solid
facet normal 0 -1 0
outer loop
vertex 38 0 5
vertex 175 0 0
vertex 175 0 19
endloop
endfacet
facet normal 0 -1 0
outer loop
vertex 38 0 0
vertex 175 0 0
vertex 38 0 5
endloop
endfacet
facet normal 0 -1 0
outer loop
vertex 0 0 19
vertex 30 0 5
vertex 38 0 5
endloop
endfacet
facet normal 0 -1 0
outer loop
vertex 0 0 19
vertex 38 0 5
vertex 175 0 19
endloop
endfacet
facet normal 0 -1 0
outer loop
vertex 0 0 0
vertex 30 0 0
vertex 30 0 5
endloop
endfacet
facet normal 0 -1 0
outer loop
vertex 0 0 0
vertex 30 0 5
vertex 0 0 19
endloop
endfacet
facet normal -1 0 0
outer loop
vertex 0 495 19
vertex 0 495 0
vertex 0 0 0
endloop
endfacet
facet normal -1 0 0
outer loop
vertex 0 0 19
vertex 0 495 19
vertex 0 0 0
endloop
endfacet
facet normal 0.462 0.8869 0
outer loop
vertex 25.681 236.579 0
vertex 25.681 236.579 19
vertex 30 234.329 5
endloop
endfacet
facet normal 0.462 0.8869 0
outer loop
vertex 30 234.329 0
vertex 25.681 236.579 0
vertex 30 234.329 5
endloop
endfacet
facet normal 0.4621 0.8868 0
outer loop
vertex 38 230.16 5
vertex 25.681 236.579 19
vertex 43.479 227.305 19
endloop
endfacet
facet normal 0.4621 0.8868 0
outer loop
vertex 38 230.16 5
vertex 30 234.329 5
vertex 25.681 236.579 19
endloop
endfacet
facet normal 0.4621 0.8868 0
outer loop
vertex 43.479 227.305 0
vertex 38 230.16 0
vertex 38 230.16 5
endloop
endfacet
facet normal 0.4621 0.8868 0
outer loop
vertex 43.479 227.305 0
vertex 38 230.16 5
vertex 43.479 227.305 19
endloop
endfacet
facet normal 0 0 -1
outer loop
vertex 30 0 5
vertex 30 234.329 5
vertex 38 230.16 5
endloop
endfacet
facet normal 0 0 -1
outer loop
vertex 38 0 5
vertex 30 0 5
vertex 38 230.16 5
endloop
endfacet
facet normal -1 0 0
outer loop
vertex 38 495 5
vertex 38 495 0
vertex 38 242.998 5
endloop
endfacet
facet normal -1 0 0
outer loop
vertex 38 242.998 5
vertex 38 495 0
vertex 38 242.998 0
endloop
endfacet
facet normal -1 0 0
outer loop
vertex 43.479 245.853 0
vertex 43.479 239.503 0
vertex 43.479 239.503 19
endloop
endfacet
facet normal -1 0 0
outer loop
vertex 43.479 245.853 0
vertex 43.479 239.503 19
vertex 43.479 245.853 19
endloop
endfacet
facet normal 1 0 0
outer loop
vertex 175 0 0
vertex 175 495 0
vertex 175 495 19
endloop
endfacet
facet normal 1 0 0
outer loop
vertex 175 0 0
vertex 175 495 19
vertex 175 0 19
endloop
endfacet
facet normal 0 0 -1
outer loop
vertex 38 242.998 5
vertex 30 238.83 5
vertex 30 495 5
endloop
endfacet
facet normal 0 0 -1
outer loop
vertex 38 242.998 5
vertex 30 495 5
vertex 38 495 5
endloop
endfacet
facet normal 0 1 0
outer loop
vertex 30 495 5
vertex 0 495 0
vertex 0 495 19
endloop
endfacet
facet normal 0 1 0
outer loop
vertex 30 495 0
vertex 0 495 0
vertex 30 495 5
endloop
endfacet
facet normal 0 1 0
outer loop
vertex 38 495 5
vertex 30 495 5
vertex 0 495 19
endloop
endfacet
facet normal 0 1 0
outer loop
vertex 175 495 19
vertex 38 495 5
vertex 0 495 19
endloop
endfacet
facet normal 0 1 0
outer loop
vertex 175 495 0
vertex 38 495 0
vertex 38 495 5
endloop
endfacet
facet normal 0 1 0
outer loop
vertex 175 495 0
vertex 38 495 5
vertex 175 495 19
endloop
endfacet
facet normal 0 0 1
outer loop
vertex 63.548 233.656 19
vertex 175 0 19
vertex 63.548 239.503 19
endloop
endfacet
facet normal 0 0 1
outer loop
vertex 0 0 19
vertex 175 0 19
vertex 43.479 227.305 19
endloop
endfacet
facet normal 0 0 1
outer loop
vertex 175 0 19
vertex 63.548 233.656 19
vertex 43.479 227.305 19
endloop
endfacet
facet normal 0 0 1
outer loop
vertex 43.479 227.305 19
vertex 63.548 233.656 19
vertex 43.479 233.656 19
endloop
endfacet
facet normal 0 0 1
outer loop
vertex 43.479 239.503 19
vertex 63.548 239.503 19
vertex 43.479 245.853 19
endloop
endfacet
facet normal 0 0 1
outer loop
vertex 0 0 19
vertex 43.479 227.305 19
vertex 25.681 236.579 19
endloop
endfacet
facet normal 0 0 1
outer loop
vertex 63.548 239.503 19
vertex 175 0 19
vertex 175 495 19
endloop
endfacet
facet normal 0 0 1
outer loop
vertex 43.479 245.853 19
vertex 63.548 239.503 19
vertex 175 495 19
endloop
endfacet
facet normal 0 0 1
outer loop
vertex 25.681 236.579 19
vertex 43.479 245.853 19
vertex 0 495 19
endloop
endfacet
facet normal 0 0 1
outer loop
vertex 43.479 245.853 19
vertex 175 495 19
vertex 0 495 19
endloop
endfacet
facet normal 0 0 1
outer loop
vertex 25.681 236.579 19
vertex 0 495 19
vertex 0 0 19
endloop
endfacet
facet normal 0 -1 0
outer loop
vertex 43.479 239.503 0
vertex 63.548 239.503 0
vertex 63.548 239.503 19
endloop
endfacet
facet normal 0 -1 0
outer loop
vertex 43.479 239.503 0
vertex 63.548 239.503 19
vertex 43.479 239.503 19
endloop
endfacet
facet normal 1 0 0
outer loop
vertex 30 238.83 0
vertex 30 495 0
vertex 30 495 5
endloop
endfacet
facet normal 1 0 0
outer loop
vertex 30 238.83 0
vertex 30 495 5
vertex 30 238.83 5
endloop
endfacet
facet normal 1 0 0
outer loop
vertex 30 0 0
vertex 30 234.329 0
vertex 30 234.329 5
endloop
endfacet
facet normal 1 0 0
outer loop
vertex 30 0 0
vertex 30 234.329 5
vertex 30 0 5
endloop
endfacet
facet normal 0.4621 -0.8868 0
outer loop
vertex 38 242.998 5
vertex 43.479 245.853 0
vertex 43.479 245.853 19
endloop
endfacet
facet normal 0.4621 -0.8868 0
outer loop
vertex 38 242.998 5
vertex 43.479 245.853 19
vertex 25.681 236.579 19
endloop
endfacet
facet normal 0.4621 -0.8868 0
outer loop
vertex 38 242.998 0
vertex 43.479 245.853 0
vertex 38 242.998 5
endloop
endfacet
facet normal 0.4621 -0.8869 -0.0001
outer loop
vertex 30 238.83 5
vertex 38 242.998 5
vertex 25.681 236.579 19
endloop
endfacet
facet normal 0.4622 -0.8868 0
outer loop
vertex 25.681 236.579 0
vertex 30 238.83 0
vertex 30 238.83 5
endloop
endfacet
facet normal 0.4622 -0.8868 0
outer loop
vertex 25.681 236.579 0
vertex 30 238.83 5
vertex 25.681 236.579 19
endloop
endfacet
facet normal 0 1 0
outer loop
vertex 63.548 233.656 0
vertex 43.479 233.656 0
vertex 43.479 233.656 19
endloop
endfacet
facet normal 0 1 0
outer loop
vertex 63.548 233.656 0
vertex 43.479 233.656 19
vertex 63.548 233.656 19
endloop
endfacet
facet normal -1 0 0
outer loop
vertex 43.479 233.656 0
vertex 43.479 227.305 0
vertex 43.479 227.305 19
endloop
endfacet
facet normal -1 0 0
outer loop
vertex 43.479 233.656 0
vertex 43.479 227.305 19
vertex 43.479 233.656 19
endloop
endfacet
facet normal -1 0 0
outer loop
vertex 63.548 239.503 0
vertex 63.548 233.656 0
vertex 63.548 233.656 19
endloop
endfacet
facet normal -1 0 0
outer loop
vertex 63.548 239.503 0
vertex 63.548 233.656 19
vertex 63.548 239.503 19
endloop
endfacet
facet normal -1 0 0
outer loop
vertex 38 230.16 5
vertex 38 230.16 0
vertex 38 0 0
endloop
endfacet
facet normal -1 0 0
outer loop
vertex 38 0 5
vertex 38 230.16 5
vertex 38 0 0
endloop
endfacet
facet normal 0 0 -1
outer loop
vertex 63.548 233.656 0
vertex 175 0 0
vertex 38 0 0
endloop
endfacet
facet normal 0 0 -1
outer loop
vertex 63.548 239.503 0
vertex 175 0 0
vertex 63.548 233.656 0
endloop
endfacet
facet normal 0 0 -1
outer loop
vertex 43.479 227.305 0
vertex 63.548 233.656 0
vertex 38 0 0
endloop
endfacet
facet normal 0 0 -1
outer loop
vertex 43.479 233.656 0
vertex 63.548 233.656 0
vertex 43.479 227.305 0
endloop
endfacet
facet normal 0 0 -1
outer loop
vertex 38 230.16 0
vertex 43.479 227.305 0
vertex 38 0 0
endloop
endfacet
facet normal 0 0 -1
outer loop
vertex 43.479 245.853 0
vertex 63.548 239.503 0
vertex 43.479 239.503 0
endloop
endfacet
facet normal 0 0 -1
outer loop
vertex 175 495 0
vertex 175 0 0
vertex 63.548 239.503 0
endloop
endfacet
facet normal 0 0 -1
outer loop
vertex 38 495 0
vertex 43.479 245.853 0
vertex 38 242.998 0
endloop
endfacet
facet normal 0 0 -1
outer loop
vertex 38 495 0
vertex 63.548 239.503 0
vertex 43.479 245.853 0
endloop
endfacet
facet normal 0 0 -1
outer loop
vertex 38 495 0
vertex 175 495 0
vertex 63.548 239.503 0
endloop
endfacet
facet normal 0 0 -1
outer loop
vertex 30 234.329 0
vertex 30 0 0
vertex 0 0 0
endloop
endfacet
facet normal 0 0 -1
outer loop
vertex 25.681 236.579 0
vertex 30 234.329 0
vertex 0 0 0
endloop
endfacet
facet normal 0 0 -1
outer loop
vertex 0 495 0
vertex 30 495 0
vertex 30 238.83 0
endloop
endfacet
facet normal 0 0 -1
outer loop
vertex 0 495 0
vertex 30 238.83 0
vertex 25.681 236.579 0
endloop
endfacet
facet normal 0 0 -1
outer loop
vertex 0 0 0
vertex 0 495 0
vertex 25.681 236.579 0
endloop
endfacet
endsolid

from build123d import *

# Parameters (mm, degrees)
PAD_DEPTH       = 19
POCKET_DEPTH    = 20
SKETCH002_W     = 8
SKETCH002_H     = 495
POCKET001_DEPTH = 5


with BuildPart() as part:
    # Sketch → Pad (new body)
    with BuildSketch(Plane.XY):
        Polygon((0, 495), (175, 495), (175, 0), (0, 0), (0, 247.5), align=None)
    extrude(amount=PAD_DEPTH)

    # Sketch001 (on Face6 of Pad) → Pocket (cut)
    with BuildSketch(Plane(origin=(0, 0, 0), x_dir=(1, 0, 0), z_dir=(0, 0, -1))):
        Polygon((43.478867, -245.853387), (25.68141, -236.579168), (43.478867, -227.30495), (43.478867, -233.655788), (63.547763, -233.655788), (63.547763, -239.502548), (43.478867, -239.502548), align=None)
    extrude(amount=-POCKET_DEPTH, mode=Mode.SUBTRACT)

    # Sketch002 (on Face4 of Pocket) → Pocket001 (cut)
    with BuildSketch(Plane(origin=(0, 0, 0), x_dir=(1, 0, 0), z_dir=(0, 0, -1))):
        with Locations((34, -247.5)):
            Rectangle(SKETCH002_W, SKETCH002_H)
    extrude(amount=-POCKET001_DEPTH, mode=Mode.SUBTRACT)


solid = part.part
